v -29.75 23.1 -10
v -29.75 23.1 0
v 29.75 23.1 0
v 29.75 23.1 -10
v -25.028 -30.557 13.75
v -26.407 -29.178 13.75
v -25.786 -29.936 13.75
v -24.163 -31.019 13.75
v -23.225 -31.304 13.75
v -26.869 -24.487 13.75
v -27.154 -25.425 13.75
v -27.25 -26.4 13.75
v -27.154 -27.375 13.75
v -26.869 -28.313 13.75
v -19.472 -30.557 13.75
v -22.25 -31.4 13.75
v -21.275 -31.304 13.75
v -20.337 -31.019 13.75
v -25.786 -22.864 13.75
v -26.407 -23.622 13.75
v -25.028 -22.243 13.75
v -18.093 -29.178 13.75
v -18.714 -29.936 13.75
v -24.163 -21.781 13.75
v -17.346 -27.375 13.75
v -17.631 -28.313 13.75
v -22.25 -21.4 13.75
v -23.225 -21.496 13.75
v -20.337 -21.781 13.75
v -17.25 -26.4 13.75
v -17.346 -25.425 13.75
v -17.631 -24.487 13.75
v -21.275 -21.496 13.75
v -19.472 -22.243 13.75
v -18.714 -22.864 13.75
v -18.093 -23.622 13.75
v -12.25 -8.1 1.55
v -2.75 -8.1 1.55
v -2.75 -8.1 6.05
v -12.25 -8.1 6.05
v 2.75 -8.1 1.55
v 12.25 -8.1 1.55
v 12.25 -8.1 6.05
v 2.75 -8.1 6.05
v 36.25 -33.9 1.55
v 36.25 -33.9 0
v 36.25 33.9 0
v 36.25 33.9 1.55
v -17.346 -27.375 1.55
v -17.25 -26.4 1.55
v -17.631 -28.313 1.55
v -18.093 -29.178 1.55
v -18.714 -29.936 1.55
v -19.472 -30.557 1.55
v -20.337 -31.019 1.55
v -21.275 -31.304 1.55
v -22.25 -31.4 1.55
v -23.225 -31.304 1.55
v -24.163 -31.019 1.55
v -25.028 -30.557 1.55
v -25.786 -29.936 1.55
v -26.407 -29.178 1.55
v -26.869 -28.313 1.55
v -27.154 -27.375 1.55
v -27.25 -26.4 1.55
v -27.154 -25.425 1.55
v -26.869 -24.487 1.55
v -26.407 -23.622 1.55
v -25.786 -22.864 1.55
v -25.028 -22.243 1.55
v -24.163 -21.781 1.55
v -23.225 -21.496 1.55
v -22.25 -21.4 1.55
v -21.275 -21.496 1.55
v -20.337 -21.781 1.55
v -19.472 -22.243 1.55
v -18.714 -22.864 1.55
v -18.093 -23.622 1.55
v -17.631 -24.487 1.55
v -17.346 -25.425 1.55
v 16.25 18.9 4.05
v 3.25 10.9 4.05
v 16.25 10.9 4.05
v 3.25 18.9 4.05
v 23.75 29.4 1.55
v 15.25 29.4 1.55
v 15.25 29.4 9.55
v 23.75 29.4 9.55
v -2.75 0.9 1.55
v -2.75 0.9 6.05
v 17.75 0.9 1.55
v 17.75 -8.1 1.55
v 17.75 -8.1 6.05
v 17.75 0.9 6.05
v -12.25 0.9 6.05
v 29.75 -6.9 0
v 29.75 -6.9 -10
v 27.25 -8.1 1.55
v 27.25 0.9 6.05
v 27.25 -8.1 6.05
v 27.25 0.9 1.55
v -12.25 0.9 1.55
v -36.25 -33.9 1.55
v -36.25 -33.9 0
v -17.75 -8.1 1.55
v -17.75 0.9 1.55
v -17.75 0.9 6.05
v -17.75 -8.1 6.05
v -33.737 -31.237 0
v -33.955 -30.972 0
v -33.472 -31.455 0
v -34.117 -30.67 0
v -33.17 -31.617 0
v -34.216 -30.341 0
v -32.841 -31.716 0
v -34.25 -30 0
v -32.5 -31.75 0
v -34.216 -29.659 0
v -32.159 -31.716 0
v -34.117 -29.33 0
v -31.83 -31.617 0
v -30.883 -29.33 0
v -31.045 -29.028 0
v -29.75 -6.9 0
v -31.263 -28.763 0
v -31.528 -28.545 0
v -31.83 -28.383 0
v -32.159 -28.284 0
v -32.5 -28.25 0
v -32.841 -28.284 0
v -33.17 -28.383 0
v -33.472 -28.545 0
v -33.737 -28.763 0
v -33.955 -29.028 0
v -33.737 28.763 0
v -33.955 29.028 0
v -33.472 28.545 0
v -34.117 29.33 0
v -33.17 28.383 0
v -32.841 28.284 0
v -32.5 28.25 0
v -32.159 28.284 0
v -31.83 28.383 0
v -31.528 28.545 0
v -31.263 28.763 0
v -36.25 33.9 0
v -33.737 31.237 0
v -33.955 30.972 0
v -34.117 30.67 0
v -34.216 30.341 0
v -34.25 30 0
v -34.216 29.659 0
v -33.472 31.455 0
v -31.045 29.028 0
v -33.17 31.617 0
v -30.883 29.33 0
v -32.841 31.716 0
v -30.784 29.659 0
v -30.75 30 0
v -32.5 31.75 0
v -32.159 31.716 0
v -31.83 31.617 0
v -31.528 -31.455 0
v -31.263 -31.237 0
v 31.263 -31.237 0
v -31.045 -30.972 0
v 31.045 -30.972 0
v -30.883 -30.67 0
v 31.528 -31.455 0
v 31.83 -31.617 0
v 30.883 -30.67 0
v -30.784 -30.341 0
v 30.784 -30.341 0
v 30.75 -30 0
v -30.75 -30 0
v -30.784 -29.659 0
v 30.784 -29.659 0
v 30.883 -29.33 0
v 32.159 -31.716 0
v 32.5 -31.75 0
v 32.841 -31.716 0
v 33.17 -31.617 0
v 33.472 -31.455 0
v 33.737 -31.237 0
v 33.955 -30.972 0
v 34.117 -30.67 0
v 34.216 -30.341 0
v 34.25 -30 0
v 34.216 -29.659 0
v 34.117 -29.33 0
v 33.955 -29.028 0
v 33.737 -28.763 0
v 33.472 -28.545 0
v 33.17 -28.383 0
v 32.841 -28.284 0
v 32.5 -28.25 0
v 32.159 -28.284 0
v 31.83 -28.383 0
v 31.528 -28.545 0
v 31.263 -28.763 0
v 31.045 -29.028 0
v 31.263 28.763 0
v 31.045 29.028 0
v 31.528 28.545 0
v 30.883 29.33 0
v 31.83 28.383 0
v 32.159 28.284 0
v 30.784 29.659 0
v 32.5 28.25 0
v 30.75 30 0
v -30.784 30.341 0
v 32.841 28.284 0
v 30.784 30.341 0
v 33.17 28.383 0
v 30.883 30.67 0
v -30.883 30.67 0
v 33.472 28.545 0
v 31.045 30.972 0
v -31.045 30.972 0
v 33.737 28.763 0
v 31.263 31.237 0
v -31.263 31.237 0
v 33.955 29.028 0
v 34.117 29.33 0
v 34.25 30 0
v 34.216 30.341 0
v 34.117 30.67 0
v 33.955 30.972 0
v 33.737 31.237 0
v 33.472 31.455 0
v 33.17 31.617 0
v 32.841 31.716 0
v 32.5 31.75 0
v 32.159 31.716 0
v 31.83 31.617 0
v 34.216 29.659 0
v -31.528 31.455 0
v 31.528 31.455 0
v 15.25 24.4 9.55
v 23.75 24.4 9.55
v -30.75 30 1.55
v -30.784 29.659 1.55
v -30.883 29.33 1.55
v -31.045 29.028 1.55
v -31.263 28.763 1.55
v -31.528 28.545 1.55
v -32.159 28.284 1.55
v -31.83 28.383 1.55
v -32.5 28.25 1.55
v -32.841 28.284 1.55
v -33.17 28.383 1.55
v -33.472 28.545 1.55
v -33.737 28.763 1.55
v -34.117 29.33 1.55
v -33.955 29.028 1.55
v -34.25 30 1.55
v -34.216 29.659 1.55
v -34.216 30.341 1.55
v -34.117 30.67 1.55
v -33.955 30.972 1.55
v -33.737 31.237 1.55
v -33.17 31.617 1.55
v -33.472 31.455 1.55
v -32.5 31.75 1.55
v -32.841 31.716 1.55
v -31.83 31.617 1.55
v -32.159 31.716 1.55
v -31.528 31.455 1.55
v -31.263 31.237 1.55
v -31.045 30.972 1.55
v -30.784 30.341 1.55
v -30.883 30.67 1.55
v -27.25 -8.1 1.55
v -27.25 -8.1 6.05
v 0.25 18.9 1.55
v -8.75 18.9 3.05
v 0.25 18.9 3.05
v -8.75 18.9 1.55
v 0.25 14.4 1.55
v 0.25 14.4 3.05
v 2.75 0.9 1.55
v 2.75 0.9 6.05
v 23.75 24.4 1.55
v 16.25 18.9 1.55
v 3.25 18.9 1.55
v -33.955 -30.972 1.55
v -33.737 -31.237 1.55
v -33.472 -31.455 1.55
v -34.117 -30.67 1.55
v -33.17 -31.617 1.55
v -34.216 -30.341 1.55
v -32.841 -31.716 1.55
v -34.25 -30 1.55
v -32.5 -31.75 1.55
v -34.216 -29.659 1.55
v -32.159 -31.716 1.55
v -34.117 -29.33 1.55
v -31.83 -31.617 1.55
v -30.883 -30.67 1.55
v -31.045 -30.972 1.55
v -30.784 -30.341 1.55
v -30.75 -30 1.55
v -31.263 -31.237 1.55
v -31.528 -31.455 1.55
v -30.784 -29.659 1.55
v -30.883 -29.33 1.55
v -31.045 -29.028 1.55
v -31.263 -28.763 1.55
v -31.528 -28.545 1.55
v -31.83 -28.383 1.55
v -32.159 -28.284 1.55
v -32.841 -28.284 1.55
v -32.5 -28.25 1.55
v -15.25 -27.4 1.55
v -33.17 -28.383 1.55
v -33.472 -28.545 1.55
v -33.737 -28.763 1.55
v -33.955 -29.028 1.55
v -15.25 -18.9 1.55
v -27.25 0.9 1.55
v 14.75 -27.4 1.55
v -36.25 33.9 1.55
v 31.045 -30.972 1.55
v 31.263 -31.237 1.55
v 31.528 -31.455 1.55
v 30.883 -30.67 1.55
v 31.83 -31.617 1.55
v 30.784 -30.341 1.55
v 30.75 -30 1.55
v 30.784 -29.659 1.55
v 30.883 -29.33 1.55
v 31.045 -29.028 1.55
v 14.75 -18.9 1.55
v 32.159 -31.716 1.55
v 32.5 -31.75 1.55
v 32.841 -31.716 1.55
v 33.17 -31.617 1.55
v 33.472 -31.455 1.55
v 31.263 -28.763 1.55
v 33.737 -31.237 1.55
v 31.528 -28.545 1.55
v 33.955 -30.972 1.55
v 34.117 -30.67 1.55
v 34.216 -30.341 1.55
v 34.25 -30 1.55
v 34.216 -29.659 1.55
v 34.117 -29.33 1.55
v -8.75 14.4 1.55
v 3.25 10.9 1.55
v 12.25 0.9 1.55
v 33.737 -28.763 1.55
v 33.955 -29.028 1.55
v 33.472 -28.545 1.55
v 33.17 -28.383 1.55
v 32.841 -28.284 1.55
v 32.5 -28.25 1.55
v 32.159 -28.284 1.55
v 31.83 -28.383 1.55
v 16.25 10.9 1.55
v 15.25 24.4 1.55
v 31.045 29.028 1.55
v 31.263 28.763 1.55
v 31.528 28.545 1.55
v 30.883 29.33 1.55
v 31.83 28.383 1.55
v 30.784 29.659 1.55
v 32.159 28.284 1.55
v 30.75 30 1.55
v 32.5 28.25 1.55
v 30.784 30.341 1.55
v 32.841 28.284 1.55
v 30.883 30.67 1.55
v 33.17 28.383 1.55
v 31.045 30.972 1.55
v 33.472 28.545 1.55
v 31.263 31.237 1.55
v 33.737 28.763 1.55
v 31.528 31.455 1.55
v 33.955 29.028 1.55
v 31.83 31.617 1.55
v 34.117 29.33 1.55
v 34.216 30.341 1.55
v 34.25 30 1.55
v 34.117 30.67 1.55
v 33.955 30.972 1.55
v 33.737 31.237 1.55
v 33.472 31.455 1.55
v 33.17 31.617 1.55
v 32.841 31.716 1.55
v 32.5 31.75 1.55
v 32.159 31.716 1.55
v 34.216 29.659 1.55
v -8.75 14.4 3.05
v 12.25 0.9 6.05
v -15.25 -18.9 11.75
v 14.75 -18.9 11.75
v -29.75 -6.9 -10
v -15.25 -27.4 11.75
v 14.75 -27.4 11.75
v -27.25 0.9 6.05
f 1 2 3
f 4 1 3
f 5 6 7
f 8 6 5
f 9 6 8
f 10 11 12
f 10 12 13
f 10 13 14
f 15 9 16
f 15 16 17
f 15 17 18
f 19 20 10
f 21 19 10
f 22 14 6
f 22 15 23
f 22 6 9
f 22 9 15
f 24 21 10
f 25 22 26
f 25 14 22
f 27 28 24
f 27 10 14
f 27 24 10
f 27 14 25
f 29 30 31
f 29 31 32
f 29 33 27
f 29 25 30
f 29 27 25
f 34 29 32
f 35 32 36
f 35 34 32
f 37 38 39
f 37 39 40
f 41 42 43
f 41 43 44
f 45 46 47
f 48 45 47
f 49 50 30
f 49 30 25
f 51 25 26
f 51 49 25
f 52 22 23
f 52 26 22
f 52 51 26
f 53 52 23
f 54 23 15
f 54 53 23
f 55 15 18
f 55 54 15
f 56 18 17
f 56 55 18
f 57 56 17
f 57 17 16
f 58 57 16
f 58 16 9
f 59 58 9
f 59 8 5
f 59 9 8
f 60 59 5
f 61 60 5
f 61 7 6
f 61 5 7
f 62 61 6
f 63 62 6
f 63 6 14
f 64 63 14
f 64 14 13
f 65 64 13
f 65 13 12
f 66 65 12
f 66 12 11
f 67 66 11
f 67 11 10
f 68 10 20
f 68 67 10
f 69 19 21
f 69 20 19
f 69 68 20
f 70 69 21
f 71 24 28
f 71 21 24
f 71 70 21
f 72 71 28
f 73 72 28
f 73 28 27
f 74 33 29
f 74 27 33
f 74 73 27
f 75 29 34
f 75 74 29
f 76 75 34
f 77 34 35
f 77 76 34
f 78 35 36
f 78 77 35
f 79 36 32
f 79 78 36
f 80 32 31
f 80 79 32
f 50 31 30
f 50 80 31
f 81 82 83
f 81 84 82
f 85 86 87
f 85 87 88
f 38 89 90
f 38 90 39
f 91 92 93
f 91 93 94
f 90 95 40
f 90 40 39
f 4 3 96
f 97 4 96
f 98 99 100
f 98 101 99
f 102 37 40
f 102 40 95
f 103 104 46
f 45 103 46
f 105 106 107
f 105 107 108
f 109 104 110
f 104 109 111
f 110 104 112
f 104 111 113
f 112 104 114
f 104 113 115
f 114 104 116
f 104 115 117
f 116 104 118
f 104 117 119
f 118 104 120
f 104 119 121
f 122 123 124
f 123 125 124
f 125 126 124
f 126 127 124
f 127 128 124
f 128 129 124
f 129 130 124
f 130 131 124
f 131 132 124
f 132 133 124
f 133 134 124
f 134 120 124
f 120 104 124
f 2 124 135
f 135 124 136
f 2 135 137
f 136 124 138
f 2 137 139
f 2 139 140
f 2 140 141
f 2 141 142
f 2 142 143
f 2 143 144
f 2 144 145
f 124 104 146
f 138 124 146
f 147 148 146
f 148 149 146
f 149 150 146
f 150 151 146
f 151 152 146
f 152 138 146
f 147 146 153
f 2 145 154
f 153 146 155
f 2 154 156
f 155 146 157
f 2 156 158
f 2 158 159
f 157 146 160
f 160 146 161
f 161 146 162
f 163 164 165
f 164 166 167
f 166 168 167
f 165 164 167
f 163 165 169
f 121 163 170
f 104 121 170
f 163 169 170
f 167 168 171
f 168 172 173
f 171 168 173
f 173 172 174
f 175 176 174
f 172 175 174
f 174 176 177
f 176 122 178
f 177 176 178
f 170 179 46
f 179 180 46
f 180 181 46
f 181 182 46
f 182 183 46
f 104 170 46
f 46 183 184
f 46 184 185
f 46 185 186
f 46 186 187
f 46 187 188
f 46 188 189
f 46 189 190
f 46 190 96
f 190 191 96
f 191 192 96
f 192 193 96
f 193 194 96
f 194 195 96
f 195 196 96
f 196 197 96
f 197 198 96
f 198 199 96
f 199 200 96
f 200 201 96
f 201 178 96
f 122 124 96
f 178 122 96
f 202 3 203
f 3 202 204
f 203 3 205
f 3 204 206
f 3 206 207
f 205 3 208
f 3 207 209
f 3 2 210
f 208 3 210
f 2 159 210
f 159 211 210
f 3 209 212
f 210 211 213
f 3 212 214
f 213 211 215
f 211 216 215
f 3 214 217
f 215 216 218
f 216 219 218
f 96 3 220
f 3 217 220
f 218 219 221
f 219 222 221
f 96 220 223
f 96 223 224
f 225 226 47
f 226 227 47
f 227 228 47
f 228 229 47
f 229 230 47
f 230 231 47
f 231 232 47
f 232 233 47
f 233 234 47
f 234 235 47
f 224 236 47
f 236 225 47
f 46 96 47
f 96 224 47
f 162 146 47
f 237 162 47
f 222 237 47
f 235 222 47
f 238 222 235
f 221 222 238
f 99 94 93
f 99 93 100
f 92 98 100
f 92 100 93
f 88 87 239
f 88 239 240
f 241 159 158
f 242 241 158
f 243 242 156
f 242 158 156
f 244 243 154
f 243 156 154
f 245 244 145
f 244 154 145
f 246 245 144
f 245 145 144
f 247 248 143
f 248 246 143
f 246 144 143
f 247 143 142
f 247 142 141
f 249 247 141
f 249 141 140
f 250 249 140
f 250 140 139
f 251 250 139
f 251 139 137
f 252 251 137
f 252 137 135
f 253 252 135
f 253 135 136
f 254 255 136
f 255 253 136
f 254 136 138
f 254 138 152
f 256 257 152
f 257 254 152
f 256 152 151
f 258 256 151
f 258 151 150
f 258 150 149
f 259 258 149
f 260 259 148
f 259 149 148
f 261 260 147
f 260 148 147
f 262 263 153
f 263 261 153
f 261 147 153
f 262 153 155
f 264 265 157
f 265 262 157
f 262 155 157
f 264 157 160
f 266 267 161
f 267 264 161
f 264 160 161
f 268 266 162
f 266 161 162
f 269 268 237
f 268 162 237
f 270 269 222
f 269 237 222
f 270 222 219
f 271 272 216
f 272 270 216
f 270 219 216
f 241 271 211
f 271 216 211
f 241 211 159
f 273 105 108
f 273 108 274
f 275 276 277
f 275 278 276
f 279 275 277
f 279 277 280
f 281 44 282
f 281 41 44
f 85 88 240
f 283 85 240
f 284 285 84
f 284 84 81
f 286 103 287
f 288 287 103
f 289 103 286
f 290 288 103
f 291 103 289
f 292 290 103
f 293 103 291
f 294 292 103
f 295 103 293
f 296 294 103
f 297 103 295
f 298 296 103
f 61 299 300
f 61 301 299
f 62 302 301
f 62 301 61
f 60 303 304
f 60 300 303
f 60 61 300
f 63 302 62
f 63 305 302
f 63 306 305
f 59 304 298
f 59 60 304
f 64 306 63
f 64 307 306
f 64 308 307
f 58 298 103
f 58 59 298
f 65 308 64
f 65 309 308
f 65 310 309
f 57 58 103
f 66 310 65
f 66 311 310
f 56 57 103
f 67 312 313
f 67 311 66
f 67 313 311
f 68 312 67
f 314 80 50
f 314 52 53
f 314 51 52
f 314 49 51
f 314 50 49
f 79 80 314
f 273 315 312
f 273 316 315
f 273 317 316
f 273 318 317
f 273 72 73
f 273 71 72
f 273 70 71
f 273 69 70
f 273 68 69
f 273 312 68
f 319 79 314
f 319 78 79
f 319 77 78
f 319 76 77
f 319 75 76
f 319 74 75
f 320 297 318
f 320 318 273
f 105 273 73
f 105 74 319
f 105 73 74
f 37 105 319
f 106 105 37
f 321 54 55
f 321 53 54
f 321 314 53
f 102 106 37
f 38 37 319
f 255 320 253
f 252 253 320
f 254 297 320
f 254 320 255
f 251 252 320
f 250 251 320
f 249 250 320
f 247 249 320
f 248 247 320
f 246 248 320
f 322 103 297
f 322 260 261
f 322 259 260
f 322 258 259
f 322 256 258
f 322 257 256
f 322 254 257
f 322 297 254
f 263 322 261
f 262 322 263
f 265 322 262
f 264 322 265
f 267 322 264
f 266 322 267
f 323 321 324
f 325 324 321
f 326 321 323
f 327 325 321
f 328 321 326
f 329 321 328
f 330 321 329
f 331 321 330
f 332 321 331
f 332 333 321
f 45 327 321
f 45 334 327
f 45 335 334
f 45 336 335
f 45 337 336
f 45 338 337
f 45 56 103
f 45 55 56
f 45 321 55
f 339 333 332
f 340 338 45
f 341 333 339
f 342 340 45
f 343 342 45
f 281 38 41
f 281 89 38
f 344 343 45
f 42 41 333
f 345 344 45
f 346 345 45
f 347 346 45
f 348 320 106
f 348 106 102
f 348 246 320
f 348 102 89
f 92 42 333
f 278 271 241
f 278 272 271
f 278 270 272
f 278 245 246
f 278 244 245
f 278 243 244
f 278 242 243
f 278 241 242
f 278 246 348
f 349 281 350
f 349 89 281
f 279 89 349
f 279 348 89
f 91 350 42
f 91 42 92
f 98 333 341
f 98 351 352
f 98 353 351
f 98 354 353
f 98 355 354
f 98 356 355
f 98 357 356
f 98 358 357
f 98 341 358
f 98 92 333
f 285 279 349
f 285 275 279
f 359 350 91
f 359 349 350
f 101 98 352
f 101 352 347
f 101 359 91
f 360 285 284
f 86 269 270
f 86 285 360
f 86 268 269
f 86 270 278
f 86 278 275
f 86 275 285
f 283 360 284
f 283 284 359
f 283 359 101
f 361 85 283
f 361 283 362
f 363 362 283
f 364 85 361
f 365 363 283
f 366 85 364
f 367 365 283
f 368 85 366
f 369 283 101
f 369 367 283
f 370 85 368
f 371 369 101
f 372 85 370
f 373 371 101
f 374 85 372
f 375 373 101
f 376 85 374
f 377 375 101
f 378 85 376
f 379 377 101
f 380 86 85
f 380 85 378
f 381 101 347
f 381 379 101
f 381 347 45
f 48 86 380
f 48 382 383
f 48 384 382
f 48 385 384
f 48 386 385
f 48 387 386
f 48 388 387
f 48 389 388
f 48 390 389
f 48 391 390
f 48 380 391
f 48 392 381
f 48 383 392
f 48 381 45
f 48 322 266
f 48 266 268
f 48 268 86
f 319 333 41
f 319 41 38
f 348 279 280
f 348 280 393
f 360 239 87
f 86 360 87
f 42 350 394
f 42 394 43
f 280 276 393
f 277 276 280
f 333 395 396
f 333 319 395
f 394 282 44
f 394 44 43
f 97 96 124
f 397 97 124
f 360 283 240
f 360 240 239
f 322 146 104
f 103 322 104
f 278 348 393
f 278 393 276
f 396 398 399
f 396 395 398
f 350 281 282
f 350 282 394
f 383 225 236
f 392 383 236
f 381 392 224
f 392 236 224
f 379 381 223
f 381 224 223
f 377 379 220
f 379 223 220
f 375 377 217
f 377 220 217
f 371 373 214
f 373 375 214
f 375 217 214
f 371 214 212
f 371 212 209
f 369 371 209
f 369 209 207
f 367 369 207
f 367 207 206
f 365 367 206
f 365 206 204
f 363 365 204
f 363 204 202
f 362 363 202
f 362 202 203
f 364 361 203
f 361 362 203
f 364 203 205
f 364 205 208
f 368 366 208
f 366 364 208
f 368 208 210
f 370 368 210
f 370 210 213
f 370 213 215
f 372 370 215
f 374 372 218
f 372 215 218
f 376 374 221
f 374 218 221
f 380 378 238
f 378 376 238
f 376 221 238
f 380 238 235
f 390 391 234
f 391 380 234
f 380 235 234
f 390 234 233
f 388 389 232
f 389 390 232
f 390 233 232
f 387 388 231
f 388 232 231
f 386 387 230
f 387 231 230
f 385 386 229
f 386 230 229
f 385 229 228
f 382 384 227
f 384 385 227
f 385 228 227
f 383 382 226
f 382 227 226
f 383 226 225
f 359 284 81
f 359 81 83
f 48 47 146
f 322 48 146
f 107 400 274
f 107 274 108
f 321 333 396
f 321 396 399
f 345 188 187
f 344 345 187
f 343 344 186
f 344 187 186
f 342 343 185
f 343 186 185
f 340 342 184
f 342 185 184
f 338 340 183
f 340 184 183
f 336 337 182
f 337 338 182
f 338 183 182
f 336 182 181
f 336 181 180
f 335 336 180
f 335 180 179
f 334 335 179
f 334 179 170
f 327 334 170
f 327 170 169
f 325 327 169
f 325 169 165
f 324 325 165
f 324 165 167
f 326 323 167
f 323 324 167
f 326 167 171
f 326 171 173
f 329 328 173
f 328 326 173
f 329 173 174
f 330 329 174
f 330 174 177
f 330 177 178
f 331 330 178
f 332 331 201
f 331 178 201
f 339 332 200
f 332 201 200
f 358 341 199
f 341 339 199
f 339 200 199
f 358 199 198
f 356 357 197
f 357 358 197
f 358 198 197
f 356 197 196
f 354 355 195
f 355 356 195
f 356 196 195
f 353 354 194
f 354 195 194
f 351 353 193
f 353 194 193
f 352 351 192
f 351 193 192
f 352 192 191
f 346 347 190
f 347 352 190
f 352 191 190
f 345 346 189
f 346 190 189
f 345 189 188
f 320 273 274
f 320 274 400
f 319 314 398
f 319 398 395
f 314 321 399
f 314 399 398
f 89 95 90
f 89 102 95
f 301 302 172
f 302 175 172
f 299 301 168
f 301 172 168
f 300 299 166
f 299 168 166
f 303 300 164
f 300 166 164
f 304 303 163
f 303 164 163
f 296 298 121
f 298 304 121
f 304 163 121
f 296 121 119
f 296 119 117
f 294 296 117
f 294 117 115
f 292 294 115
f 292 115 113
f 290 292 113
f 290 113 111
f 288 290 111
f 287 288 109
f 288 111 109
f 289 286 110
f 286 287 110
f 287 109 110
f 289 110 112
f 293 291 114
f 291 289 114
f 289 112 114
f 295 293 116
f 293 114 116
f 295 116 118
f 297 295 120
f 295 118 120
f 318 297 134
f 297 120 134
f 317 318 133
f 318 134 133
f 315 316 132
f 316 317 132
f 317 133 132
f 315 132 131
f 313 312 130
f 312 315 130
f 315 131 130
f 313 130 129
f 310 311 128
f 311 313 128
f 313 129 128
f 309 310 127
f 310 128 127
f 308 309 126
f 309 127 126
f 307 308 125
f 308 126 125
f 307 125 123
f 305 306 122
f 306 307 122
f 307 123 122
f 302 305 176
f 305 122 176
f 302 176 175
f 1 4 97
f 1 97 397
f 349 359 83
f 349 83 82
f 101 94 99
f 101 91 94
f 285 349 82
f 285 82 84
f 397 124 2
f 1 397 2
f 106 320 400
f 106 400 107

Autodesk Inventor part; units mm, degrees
ref_plane "YZ Plane" through (0, 0, 0) normal (1, 0, 0) x (0, 1, 0)
ref_plane "XZ Plane" through (0, 0, 0) normal (0, 1, 0) x (-1, 0, 0)
ref_plane "XY Plane" through (0, 0, 0) normal (0, 0, 1) x (1, 0, 0)
sketch "스케치1" plane through (0, 0, 0) normal (0, 0, 1) x (1, 0, 0)
  line L0 (-36.25, -33.9) -> (36.25, -33.9)
  line L1 (36.25, -33.9) -> (36.25, 33.9)
  line L2 (36.25, 33.9) -> (-36.25, 33.9)
  line L3 (-36.25, 33.9) -> (-36.25, -33.9)
  line L4 (-36.25, -33.9) -> (36.25, 33.9) construction
  line L5 (36.25, -33.9) -> (-36.25, 33.9) construction
  line L6 (-32.5, -30) -> (32.5, -30) construction
  line L7 (32.5, -30) -> (32.5, 30) construction
  line L8 (32.5, 30) -> (-32.5, 30) construction
  line L9 (-32.5, 30) -> (-32.5, -30) construction
  line L10 (-32.5, -30) -> (32.5, 30) construction
  line L11 (32.5, -30) -> (-32.5, 30) construction
  circle A0 centre (-32.5, 30) radius 1.75
  circle A1 centre (-32.5, -30) radius 1.75
  line L12 (0, 0) -> (0, 9.9513)
  circle A2 centre (32.5, 30) radius 1.75
  circle A3 centre (32.5, -30) radius 1.75
  dimension "d0" = 72.5
  dimension "d1" = 67.8
  dimension "d2" = 65
  dimension "d3" = 60
  dimension "d4" = 3.5
  dimension "d5" = 3.5
extrude "돌출1" add sketch "스케치1" along normal blind 1.55
sketch "스케치2" plane through (0, 0, 1.55) normal (0, 0, 1) x (1, 0, 0)
  circle A0 centre (32.5, -30) radius 1.75 projected
  circle A1 centre (-32.5, -30) radius 1.75 projected
  circle A2 centre (-32.5, 30) radius 1.75 projected
  line L0 (-36.25, -33.9) -> (36.25, -33.9) projected
  line L1 (36.25, -33.9) -> (36.25, 33.9) projected
  line L2 (36.25, 33.9) -> (-36.25, 33.9) projected
  line L3 (-15.25, -18.9) -> (14.75, -18.9)
  line L4 (14.75, -18.9) -> (14.75, -27.4)
  line L5 (14.75, -27.4) -> (-15.25, -27.4)
  line L6 (-15.25, -27.4) -> (-15.25, -18.9)
  line L7 (-27.25, 0.9) -> (-17.75, 0.9)
  line L8 (-17.75, 0.9) -> (-17.75, -8.1)
  line L9 (-17.75, -8.1) -> (-27.25, -8.1)
  line L10 (-27.25, -8.1) -> (-27.25, 0.9)
  line L11 (-12.25, 0.9) -> (-2.75, 0.9)
  line L12 (-2.75, 0.9) -> (-2.75, -8.1)
  line L13 (-2.75, -8.1) -> (-12.25, -8.1)
  line L14 (-12.25, -8.1) -> (-12.25, 0.9)
  line L15 (3.25, 18.9) -> (16.25, 18.9)
  line L16 (16.25, 18.9) -> (16.25, 10.9)
  line L17 (16.25, 10.9) -> (3.25, 10.9)
  line L18 (3.25, 10.9) -> (3.25, 18.9)
  circle A3 centre (-22.25, -26.4) radius 5
  line L19 (-8.75, 18.9) -> (0.25, 18.9)
  line L20 (0.25, 18.9) -> (0.25, 14.4)
  line L21 (0.25, 14.4) -> (-8.75, 14.4)
  line L22 (-8.75, 14.4) -> (-8.75, 18.9)
  line L23 (15.25, 29.4) -> (23.75, 29.4)
  line L24 (23.75, 29.4) -> (23.75, 24.4)
  line L25 (23.75, 24.4) -> (15.25, 24.4)
  line L26 (15.25, 24.4) -> (15.25, 29.4)
  point P0 (0, 0)
  dimension "d8" = 10
  dimension "d9" = 8.5
  dimension "d10" = 30
  dimension "d11" = 9
  dimension "d12" = 9.5
  dimension "d13" = 9.5
  dimension "d14" = 13
  dimension "d15" = 8
  dimension "d20" = 6.5
  dimension "d21" = 21.5
  dimension "d23" = 5.5
  dimension "d24" = 33
  dimension "d25" = 10
  dimension "d26" = 20
  dimension "d27" = 9
  dimension "d28" = 4.5
  dimension "d29" = 3
  dimension "d30" = 15
  dimension "d32" = 8.5
  dimension "d33" = 5
  dimension "d34" = 12.5
  dimension "d35" = 4.5
  dimension "d36" = 2.5
  dimension "d38" = 65
  dimension "d39" = 60
extrude "돌출2" add sketch "스케치2" along normal blind 12.2 contours A3
extrude "돌출3" add sketch "스케치2" along normal blind 4.5 contours L7 L8 L9 L10 | L11 L12 L13 L14
extrude "돌출4" add sketch "스케치2" along normal blind 10.2 contours L3 L4 L5 L6
extrude "돌출5" add sketch "스케치2" along normal blind 2.5 contours L15 L16 L17 L18
extrude "돌출6" add sketch "스케치2" along normal blind 1.5 contours L19 L20 L21 L22
extrude "돌출7" add sketch "스케치2" along normal blind 8 contours L23 L24 L25 L26
mirror "미러1" about plane through (0, 0, 0) normal (1, 0, 0) of "돌출3"
sketch "스케치4" plane through (0, 0, 0) normal (0, 0, -1) x (-1, 0, 0)
  line L0 (-36.25, -33.9) -> (-36.25, 33.9) projected
  line L1 (-29.75, 23.1) -> (-29.75, -6.9)
  line L2 (-29.75, -6.9) -> (29.75, -6.9)
  line L3 (29.75, -6.9) -> (29.75, 23.1)
  line L4 (29.75, 23.1) -> (-29.75, 23.1)
  line L5 (36.25, -33.9) -> (-36.25, -33.9) projected
  point P0 (0, 0)
  point P1 (0, 23.1)
  point P2 (-36.25, 0)
  dimension "d53" = 59.5
  dimension "d54" = 30
  dimension "d58" = 27
extrude "돌출8" add sketch "스케치4" along normal blind 10
properties part number "모터드라이버"
